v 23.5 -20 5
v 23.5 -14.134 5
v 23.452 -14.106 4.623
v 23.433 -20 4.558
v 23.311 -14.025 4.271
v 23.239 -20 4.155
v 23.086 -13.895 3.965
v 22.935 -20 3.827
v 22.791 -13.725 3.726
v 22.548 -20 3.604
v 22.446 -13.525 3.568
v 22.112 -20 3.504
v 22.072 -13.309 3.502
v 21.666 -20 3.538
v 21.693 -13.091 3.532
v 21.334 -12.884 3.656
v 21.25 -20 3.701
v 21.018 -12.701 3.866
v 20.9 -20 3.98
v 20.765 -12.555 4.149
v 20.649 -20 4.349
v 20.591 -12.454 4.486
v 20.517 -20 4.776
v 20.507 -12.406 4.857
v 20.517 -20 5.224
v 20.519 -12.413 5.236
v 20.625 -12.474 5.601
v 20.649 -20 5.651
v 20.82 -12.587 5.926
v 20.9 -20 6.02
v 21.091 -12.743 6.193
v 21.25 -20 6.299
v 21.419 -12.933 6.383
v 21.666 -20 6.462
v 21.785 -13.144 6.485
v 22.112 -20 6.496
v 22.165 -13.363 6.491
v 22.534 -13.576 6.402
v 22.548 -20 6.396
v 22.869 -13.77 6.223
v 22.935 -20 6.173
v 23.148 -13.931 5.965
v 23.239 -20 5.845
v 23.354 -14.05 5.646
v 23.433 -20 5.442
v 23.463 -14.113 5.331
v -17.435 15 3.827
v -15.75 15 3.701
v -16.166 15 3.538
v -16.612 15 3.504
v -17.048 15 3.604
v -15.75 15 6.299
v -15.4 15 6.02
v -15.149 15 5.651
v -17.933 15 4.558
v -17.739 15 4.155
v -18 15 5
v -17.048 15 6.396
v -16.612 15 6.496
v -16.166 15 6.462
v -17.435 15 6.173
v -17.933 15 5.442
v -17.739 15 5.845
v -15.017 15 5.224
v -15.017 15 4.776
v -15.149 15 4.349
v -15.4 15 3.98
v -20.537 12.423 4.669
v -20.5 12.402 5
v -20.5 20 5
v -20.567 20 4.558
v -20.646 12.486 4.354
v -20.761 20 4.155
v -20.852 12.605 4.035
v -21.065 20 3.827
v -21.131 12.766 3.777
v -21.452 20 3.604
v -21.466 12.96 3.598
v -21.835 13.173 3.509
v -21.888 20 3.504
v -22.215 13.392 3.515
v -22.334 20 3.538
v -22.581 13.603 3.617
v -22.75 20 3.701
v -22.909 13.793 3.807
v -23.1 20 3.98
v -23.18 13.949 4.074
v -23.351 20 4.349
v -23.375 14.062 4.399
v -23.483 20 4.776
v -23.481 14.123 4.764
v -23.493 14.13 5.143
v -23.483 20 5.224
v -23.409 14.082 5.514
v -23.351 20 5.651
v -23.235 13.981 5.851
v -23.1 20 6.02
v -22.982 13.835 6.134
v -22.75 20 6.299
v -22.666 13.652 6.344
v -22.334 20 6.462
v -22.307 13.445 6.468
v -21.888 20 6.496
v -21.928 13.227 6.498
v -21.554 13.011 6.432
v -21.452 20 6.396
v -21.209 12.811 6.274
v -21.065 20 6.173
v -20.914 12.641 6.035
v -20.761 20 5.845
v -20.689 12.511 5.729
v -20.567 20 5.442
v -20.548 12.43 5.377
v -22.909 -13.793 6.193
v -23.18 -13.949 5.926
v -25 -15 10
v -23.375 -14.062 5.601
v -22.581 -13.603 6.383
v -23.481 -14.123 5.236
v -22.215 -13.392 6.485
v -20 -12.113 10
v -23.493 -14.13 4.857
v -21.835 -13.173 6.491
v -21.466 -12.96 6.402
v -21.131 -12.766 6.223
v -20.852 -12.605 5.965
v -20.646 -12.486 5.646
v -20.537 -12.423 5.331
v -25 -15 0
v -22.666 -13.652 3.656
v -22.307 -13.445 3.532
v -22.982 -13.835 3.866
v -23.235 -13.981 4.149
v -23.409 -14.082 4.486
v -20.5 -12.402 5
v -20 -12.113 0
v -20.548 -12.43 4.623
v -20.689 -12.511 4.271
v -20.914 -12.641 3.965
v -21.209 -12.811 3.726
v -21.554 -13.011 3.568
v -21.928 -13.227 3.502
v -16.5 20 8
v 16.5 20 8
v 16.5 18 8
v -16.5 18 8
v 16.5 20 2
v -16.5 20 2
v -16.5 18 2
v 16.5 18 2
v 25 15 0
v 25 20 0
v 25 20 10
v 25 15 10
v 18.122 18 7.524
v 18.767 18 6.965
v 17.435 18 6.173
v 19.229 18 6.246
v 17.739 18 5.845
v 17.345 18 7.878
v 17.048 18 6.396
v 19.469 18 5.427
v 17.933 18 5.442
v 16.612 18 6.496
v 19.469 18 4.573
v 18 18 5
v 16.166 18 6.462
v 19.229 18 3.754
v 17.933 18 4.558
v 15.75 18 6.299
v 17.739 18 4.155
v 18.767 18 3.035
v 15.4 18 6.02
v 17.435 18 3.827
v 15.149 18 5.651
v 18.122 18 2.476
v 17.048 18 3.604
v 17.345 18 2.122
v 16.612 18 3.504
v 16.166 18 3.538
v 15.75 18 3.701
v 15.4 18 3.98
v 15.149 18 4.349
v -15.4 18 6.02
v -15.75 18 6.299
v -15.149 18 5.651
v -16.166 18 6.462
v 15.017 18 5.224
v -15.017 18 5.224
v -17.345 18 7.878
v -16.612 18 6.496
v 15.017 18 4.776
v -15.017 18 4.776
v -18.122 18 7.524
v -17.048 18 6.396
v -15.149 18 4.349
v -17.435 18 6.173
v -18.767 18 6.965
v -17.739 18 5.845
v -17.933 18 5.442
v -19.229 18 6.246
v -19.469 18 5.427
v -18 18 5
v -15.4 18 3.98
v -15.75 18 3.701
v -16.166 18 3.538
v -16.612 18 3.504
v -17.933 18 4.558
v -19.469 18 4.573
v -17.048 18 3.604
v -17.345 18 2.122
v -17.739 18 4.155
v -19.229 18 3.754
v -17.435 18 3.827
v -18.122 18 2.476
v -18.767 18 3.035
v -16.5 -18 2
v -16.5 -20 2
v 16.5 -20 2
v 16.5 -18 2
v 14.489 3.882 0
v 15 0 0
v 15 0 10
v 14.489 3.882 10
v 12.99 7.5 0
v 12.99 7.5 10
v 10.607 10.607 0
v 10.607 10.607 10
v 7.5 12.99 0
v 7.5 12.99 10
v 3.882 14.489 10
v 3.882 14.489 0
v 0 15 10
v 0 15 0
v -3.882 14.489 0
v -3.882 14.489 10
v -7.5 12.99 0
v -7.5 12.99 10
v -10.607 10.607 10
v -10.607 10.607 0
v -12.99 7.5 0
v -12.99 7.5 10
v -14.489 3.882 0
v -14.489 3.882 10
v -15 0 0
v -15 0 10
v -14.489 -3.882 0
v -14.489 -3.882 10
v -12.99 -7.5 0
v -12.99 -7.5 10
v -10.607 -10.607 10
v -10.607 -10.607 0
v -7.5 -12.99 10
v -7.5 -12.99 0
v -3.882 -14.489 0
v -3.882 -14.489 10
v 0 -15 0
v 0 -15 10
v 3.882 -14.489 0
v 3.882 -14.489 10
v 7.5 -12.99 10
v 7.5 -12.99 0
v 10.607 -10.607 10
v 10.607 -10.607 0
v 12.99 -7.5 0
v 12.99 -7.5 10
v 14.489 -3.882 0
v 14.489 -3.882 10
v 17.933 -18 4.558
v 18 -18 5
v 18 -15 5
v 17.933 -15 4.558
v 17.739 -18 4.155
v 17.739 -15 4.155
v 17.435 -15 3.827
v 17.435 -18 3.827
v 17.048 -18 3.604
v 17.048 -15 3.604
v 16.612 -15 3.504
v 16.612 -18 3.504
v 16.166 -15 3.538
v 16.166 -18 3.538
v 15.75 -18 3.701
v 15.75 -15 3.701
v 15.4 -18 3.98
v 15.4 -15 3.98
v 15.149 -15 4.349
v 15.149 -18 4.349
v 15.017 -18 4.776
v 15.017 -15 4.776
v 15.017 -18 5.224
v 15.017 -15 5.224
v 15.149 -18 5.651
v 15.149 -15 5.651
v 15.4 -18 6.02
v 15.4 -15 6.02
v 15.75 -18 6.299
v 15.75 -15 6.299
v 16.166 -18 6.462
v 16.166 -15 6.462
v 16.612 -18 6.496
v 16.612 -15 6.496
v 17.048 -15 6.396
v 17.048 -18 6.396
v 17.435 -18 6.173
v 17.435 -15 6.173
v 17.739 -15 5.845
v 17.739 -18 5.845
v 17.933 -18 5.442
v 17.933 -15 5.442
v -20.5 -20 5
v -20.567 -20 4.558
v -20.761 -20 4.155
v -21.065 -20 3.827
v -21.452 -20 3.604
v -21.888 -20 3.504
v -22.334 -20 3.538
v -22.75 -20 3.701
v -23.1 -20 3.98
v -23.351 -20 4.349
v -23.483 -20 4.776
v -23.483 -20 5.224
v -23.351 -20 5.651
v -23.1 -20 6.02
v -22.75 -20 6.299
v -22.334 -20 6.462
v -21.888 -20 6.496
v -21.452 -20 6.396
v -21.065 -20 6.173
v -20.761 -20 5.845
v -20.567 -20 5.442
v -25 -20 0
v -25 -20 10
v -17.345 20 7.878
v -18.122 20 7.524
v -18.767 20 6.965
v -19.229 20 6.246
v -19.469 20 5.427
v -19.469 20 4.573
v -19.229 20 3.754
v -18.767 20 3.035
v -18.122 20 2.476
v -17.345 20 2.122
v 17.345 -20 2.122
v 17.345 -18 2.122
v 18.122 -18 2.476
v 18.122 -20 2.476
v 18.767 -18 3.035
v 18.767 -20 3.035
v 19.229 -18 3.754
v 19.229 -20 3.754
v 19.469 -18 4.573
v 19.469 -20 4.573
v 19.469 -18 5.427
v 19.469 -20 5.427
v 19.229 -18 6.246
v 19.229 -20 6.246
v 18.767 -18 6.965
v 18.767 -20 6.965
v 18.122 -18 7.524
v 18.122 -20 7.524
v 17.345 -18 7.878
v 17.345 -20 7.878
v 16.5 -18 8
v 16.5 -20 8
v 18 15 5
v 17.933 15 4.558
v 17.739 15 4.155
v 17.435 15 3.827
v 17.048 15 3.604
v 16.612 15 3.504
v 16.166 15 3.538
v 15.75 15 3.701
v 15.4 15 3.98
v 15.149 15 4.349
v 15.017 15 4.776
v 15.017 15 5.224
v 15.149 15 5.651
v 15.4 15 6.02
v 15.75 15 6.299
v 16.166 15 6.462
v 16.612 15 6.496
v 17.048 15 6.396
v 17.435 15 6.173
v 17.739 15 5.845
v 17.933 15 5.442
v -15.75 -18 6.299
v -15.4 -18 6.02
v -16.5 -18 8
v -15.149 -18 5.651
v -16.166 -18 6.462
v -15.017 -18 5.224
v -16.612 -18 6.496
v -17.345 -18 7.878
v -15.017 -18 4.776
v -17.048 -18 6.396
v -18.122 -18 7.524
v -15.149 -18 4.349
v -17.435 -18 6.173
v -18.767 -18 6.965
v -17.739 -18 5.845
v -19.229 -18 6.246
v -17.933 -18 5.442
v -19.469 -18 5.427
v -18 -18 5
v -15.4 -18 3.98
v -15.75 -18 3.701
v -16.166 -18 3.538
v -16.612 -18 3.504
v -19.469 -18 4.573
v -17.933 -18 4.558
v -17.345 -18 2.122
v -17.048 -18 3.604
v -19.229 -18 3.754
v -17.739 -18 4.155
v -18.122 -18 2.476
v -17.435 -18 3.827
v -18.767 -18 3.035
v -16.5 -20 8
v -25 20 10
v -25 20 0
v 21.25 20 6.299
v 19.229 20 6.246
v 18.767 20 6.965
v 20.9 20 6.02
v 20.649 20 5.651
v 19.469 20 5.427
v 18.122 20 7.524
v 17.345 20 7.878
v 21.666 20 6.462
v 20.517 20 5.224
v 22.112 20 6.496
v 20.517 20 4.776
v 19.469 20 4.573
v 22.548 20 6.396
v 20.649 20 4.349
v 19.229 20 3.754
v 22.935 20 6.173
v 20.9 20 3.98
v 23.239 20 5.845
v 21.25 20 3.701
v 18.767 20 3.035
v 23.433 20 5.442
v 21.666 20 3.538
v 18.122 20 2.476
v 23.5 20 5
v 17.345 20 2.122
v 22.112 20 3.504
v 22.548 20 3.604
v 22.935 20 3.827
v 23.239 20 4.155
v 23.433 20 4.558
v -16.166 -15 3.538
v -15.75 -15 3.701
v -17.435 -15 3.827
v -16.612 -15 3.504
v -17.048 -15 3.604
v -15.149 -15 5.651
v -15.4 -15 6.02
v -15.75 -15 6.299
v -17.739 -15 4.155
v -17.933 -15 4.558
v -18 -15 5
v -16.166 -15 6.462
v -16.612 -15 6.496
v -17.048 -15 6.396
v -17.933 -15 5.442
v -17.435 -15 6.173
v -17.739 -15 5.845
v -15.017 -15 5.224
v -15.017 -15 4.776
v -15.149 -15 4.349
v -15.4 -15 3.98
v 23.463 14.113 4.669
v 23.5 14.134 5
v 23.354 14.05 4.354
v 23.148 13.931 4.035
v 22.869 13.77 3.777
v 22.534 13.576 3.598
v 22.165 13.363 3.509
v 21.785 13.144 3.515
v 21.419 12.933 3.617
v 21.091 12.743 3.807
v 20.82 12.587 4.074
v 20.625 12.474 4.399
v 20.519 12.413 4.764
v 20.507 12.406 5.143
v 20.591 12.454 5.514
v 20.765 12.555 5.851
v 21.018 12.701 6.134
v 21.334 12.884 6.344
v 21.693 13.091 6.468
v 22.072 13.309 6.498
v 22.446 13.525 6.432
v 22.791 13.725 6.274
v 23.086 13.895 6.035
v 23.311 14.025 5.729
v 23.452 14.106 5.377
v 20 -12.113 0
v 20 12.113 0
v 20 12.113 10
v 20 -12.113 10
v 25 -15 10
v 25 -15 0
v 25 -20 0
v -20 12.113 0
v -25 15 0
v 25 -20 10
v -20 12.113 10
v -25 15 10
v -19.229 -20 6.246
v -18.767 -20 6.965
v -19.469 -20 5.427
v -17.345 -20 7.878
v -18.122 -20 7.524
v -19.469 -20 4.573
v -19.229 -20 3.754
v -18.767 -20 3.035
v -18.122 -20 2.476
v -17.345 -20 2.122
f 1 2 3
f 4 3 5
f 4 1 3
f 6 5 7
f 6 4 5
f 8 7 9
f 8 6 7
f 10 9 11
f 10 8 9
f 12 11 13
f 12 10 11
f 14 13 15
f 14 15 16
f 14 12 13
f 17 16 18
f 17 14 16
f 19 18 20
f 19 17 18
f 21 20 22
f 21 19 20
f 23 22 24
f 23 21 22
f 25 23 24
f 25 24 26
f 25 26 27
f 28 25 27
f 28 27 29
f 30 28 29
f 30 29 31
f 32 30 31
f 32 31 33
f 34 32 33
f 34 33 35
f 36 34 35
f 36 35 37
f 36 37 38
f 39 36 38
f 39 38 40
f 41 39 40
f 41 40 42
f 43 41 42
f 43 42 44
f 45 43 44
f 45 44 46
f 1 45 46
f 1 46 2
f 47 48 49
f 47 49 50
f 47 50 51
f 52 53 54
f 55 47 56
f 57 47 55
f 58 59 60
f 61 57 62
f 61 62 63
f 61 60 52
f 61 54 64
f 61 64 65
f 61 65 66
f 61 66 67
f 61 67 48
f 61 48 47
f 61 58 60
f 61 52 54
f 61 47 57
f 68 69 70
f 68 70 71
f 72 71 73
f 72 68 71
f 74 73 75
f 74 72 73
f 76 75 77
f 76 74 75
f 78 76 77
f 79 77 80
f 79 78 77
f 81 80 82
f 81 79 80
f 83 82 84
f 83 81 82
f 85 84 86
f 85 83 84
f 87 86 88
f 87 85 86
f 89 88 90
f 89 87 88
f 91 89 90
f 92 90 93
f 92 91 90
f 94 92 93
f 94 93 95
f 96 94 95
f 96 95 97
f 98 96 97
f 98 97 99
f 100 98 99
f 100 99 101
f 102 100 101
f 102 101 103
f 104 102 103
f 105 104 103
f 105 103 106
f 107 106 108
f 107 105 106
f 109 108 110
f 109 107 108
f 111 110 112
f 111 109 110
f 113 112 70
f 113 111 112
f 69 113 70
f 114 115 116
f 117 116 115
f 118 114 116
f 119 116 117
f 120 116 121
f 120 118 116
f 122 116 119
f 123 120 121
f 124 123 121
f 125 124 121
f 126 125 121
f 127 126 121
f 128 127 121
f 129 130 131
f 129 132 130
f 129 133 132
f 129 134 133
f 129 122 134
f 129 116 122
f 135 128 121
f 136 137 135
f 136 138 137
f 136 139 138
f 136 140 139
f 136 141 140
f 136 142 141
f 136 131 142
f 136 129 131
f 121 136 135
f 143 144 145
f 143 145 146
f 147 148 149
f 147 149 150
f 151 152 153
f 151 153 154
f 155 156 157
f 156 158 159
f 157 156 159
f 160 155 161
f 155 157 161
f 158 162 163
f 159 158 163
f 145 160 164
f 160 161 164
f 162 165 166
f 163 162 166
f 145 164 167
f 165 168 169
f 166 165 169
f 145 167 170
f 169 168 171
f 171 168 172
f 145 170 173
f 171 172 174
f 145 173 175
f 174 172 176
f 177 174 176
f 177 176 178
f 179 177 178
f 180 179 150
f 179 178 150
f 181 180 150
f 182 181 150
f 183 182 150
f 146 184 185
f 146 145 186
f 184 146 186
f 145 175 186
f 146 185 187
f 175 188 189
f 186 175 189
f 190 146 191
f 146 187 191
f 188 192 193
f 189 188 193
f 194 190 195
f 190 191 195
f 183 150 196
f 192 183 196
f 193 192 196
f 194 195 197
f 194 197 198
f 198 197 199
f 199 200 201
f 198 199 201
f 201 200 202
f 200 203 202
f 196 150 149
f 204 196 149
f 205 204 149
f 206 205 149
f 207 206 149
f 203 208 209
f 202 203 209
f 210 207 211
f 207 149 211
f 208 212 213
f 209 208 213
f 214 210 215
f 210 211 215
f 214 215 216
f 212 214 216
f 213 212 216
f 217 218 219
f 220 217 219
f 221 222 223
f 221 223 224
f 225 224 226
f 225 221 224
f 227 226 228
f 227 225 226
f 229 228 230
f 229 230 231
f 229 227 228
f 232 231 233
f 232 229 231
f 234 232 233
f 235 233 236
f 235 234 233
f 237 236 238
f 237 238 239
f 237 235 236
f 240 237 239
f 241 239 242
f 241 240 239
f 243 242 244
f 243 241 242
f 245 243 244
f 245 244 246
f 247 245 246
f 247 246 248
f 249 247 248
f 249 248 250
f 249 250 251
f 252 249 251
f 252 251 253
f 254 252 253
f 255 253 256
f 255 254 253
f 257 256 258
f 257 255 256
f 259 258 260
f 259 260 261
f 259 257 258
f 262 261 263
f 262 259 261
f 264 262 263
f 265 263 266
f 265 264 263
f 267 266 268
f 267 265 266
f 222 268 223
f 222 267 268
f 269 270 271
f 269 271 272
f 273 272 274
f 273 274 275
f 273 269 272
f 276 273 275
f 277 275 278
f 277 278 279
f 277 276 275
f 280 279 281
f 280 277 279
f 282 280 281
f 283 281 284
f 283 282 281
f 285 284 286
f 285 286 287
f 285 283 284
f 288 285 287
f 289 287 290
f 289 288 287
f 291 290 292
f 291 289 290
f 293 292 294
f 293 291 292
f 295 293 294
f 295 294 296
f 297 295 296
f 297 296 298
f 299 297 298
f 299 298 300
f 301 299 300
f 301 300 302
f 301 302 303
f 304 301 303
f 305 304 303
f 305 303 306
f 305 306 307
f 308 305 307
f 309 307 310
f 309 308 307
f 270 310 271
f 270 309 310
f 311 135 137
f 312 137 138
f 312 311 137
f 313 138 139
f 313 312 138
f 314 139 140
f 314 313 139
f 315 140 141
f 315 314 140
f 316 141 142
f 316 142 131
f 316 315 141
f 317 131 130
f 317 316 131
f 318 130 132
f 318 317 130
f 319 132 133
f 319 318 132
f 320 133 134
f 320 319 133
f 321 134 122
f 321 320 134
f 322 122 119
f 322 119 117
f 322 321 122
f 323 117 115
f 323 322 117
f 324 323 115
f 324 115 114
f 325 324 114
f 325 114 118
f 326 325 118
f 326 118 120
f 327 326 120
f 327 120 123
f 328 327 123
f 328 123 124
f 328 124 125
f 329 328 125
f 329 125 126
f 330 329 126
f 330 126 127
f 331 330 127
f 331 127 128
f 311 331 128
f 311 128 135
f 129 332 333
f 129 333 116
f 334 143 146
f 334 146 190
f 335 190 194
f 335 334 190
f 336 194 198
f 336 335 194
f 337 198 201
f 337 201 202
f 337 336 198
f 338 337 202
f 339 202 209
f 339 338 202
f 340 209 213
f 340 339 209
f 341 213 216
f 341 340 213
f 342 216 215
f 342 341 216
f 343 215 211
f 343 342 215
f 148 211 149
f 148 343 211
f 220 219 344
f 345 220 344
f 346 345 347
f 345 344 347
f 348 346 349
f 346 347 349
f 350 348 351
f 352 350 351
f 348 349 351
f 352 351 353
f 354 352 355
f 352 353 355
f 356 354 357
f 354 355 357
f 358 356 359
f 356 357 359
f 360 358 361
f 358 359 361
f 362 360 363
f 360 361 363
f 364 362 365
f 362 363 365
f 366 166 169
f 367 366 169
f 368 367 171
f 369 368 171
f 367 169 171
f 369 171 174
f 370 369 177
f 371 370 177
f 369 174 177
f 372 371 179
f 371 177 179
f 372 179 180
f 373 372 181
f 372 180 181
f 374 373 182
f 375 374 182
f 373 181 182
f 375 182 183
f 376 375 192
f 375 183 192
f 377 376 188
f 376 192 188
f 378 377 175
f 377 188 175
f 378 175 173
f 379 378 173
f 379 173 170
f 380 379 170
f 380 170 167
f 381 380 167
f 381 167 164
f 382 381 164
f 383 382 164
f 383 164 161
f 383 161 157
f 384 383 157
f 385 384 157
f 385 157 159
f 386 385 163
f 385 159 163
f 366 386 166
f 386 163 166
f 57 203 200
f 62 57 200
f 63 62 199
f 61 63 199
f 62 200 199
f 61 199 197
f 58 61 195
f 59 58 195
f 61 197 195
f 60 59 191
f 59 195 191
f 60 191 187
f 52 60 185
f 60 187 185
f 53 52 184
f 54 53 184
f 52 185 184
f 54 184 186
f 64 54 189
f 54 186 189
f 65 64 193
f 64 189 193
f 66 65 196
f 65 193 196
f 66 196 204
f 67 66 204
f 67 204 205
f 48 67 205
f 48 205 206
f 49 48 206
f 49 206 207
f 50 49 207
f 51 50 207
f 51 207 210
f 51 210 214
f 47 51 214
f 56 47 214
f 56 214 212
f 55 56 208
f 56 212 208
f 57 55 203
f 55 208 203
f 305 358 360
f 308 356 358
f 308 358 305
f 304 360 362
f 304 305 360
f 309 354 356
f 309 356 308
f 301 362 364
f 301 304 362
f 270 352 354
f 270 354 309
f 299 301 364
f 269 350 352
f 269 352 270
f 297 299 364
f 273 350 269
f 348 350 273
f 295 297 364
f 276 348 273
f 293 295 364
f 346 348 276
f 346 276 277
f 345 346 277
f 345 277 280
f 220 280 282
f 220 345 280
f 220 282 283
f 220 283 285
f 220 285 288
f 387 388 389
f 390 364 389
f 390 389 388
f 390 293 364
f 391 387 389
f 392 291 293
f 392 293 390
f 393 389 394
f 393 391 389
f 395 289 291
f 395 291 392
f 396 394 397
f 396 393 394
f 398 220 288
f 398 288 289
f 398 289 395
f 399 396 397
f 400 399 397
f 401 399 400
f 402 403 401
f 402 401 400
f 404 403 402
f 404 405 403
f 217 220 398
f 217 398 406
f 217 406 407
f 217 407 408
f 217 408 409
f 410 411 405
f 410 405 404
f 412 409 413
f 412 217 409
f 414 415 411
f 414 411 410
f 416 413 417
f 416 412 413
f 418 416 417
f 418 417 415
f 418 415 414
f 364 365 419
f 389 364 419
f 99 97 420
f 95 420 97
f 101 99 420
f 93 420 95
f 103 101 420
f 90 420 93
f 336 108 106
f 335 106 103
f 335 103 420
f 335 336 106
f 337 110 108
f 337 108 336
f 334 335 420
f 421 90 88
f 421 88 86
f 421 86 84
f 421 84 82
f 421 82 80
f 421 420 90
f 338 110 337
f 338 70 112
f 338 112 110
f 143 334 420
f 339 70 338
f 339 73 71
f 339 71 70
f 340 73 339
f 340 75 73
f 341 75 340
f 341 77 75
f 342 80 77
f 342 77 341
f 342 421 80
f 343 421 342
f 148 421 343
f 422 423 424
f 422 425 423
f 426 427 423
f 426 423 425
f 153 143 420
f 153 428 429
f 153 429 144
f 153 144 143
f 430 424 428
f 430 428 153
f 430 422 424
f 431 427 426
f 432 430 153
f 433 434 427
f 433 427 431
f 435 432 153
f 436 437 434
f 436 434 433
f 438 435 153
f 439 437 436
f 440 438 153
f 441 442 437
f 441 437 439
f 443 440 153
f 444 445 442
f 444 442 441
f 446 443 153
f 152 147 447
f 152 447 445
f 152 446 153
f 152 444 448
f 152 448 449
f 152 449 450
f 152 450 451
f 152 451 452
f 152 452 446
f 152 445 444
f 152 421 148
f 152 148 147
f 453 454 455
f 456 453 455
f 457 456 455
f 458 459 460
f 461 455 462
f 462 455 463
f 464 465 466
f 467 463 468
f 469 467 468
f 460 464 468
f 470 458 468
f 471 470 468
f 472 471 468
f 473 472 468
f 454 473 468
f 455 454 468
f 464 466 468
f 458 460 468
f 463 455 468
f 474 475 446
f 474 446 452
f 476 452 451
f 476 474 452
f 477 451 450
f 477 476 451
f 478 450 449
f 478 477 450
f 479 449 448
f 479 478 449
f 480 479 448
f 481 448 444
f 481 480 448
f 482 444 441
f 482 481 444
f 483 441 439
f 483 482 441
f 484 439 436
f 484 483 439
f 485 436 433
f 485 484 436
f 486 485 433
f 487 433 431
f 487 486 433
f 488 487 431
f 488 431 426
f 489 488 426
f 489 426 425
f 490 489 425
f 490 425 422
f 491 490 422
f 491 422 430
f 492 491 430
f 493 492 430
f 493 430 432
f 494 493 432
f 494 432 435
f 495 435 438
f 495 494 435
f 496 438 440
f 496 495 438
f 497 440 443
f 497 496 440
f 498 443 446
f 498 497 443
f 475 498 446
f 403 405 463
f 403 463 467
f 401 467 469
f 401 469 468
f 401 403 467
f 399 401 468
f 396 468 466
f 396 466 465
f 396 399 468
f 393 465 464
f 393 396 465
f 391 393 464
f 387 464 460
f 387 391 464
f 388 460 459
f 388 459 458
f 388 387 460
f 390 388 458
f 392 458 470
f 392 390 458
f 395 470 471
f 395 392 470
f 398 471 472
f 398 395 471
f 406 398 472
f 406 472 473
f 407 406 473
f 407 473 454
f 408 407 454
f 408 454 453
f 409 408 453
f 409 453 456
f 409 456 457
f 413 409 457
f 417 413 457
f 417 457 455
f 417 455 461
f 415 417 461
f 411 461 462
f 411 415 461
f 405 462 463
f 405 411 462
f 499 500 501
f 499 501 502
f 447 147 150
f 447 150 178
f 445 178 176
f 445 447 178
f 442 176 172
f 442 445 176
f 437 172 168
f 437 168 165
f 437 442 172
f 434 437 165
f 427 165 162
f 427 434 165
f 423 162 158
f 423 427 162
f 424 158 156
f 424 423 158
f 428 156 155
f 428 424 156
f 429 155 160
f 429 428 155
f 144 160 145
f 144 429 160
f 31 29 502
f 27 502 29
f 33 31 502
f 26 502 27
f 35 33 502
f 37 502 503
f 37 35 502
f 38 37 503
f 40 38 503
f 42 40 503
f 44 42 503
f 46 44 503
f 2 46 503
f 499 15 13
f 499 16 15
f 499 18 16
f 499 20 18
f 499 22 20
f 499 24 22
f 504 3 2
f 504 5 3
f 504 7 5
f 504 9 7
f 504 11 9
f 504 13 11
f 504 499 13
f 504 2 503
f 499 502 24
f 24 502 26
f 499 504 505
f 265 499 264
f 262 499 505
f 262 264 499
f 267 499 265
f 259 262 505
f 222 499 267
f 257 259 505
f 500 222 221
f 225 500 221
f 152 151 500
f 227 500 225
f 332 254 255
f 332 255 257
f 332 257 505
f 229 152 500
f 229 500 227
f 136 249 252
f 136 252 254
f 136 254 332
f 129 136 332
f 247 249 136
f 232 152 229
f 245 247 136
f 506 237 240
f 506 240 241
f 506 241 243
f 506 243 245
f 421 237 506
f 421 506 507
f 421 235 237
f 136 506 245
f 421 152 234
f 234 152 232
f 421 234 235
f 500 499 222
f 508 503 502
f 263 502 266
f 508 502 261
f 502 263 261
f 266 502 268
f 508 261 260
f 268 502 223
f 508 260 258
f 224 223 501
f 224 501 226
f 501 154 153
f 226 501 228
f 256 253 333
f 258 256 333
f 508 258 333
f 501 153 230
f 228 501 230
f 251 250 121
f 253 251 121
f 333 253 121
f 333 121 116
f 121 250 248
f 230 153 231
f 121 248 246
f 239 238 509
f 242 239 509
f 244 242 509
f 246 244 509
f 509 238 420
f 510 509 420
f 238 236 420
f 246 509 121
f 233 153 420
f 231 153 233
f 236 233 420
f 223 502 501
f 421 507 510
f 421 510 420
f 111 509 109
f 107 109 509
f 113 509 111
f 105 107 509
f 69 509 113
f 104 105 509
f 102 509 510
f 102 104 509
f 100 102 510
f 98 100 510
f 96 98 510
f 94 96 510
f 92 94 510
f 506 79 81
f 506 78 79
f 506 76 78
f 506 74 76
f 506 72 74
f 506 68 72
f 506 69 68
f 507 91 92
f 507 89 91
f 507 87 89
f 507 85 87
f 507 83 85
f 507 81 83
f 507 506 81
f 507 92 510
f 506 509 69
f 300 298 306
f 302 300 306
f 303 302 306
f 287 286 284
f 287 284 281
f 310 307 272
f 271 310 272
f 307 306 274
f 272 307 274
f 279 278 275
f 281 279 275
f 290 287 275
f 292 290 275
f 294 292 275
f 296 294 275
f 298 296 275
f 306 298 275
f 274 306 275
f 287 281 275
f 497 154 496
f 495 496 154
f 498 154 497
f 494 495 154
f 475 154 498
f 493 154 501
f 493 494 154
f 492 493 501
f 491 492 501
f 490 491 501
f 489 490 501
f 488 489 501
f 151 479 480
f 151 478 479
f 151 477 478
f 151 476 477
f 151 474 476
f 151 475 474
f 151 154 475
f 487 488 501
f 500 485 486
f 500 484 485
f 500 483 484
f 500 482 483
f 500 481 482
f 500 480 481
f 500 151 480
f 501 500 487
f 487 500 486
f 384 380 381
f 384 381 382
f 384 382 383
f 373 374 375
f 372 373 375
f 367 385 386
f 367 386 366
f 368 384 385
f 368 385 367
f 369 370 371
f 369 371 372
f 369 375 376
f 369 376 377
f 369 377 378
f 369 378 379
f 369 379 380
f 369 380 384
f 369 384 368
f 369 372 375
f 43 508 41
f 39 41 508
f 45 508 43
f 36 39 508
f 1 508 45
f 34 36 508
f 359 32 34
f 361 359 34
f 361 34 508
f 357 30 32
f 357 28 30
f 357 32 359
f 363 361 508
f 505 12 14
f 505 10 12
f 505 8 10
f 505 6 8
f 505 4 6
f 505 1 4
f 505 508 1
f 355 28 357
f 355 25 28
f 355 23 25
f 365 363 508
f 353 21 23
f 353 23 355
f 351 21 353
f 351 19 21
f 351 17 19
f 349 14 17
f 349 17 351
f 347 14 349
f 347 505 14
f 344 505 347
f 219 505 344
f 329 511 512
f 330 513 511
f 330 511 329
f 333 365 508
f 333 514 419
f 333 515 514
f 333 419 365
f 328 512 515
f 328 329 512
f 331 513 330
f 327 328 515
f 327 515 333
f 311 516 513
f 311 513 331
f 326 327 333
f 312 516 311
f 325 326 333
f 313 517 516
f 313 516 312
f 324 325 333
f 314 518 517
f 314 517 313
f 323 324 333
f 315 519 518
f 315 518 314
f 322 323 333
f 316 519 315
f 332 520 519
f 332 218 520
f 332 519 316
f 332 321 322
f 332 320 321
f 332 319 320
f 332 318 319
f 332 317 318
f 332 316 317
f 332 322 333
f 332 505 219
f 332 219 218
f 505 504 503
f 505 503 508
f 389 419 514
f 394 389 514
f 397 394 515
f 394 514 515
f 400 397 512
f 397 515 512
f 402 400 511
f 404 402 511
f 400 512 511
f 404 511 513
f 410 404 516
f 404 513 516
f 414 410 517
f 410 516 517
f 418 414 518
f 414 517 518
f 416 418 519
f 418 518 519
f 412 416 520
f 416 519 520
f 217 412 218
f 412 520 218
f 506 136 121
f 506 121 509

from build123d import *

# Parameters (mm, degrees)
SKETCH_1_R               = 15
EXTRUDE_1_DEPTH          = 10
CUT_EXTRUDE_1_DEPTH      = 49.218253805
CUT_EXTRUDE_1_DEPTH_BACK = 49.218253805
SKETCH_2_R               = 1.5
CUT_EXTRUDE_2_DEPTH      = 2
SKETCH_4_R               = 1.5
CUT_EXTRUDE_3_DEPTH      = 3


with BuildPart() as part:
    # 草图1 → 凸台-拉伸1 (new body)
    with BuildSketch(Plane.XY):
        Polygon((-25, -20), (-25, -15), (-20, -12.113248654), (-20, 12.113248654), (-25, 15), (-25, 20), (25, 20), (25, 15), (20, 12.113248654), (20, -12.113248654), (25, -15), (25, -20), align=None)
        Circle(SKETCH_1_R, mode=Mode.SUBTRACT)
    extrude(amount=EXTRUDE_1_DEPTH)

    # 草图2 → 切除-拉伸1 (cut, two sides: drawn at the far end of the back side and taken through both)
    with BuildSketch(Plane(origin=(0, 20, 0), x_dir=(1, 0, 0), z_dir=(0, 1, 0)).offset(-CUT_EXTRUDE_1_DEPTH_BACK)):
        with Locations((-22, -5)):
            Circle(SKETCH_2_R)
        with Locations((22, -5)):
            Circle(SKETCH_2_R)
    extrude(amount=CUT_EXTRUDE_1_DEPTH + CUT_EXTRUDE_1_DEPTH_BACK, mode=Mode.SUBTRACT)

    # 草图3 → 切除-拉伸2 (cut)
    with BuildSketch(Plane(origin=(0, 20, 0), x_dir=(1, 0, 0), z_dir=(0, 1, 0))):
        with BuildLine():
            Line((-16.5, -2), (16.5, -2))
            ThreePointArc((16.5, -2), (19.5, -5), (16.5, -8))
            Line((16.5, -8), (-16.5, -8))
            ThreePointArc((-16.5, -8), (-19.5, -5), (-16.5, -2))
        make_face()
    cut_extrude_2 = extrude(amount=-CUT_EXTRUDE_2_DEPTH, mode=Mode.SUBTRACT)

    # 草图4 → 切除-拉伸3 (cut)
    with BuildSketch(Plane(origin=(0, 18, 0), x_dir=(1, 0, 0), z_dir=(0, 1, 0))):
        with Locations(Location((-16.5, -5, 0), (0, 0, 180))):
            Circle(SKETCH_4_R)
        with Locations((16.5, -5)):
            Circle(SKETCH_4_R)
    cut_extrude_3 = extrude(amount=-CUT_EXTRUDE_3_DEPTH, mode=Mode.SUBTRACT)

    # 镜向1: 切除-拉伸2, 切除-拉伸3 across plane
    add(cut_extrude_2.mirror(Plane.ZX), mode=Mode.SUBTRACT)
    add(cut_extrude_3.mirror(Plane.ZX), mode=Mode.SUBTRACT)


solid = part.part
